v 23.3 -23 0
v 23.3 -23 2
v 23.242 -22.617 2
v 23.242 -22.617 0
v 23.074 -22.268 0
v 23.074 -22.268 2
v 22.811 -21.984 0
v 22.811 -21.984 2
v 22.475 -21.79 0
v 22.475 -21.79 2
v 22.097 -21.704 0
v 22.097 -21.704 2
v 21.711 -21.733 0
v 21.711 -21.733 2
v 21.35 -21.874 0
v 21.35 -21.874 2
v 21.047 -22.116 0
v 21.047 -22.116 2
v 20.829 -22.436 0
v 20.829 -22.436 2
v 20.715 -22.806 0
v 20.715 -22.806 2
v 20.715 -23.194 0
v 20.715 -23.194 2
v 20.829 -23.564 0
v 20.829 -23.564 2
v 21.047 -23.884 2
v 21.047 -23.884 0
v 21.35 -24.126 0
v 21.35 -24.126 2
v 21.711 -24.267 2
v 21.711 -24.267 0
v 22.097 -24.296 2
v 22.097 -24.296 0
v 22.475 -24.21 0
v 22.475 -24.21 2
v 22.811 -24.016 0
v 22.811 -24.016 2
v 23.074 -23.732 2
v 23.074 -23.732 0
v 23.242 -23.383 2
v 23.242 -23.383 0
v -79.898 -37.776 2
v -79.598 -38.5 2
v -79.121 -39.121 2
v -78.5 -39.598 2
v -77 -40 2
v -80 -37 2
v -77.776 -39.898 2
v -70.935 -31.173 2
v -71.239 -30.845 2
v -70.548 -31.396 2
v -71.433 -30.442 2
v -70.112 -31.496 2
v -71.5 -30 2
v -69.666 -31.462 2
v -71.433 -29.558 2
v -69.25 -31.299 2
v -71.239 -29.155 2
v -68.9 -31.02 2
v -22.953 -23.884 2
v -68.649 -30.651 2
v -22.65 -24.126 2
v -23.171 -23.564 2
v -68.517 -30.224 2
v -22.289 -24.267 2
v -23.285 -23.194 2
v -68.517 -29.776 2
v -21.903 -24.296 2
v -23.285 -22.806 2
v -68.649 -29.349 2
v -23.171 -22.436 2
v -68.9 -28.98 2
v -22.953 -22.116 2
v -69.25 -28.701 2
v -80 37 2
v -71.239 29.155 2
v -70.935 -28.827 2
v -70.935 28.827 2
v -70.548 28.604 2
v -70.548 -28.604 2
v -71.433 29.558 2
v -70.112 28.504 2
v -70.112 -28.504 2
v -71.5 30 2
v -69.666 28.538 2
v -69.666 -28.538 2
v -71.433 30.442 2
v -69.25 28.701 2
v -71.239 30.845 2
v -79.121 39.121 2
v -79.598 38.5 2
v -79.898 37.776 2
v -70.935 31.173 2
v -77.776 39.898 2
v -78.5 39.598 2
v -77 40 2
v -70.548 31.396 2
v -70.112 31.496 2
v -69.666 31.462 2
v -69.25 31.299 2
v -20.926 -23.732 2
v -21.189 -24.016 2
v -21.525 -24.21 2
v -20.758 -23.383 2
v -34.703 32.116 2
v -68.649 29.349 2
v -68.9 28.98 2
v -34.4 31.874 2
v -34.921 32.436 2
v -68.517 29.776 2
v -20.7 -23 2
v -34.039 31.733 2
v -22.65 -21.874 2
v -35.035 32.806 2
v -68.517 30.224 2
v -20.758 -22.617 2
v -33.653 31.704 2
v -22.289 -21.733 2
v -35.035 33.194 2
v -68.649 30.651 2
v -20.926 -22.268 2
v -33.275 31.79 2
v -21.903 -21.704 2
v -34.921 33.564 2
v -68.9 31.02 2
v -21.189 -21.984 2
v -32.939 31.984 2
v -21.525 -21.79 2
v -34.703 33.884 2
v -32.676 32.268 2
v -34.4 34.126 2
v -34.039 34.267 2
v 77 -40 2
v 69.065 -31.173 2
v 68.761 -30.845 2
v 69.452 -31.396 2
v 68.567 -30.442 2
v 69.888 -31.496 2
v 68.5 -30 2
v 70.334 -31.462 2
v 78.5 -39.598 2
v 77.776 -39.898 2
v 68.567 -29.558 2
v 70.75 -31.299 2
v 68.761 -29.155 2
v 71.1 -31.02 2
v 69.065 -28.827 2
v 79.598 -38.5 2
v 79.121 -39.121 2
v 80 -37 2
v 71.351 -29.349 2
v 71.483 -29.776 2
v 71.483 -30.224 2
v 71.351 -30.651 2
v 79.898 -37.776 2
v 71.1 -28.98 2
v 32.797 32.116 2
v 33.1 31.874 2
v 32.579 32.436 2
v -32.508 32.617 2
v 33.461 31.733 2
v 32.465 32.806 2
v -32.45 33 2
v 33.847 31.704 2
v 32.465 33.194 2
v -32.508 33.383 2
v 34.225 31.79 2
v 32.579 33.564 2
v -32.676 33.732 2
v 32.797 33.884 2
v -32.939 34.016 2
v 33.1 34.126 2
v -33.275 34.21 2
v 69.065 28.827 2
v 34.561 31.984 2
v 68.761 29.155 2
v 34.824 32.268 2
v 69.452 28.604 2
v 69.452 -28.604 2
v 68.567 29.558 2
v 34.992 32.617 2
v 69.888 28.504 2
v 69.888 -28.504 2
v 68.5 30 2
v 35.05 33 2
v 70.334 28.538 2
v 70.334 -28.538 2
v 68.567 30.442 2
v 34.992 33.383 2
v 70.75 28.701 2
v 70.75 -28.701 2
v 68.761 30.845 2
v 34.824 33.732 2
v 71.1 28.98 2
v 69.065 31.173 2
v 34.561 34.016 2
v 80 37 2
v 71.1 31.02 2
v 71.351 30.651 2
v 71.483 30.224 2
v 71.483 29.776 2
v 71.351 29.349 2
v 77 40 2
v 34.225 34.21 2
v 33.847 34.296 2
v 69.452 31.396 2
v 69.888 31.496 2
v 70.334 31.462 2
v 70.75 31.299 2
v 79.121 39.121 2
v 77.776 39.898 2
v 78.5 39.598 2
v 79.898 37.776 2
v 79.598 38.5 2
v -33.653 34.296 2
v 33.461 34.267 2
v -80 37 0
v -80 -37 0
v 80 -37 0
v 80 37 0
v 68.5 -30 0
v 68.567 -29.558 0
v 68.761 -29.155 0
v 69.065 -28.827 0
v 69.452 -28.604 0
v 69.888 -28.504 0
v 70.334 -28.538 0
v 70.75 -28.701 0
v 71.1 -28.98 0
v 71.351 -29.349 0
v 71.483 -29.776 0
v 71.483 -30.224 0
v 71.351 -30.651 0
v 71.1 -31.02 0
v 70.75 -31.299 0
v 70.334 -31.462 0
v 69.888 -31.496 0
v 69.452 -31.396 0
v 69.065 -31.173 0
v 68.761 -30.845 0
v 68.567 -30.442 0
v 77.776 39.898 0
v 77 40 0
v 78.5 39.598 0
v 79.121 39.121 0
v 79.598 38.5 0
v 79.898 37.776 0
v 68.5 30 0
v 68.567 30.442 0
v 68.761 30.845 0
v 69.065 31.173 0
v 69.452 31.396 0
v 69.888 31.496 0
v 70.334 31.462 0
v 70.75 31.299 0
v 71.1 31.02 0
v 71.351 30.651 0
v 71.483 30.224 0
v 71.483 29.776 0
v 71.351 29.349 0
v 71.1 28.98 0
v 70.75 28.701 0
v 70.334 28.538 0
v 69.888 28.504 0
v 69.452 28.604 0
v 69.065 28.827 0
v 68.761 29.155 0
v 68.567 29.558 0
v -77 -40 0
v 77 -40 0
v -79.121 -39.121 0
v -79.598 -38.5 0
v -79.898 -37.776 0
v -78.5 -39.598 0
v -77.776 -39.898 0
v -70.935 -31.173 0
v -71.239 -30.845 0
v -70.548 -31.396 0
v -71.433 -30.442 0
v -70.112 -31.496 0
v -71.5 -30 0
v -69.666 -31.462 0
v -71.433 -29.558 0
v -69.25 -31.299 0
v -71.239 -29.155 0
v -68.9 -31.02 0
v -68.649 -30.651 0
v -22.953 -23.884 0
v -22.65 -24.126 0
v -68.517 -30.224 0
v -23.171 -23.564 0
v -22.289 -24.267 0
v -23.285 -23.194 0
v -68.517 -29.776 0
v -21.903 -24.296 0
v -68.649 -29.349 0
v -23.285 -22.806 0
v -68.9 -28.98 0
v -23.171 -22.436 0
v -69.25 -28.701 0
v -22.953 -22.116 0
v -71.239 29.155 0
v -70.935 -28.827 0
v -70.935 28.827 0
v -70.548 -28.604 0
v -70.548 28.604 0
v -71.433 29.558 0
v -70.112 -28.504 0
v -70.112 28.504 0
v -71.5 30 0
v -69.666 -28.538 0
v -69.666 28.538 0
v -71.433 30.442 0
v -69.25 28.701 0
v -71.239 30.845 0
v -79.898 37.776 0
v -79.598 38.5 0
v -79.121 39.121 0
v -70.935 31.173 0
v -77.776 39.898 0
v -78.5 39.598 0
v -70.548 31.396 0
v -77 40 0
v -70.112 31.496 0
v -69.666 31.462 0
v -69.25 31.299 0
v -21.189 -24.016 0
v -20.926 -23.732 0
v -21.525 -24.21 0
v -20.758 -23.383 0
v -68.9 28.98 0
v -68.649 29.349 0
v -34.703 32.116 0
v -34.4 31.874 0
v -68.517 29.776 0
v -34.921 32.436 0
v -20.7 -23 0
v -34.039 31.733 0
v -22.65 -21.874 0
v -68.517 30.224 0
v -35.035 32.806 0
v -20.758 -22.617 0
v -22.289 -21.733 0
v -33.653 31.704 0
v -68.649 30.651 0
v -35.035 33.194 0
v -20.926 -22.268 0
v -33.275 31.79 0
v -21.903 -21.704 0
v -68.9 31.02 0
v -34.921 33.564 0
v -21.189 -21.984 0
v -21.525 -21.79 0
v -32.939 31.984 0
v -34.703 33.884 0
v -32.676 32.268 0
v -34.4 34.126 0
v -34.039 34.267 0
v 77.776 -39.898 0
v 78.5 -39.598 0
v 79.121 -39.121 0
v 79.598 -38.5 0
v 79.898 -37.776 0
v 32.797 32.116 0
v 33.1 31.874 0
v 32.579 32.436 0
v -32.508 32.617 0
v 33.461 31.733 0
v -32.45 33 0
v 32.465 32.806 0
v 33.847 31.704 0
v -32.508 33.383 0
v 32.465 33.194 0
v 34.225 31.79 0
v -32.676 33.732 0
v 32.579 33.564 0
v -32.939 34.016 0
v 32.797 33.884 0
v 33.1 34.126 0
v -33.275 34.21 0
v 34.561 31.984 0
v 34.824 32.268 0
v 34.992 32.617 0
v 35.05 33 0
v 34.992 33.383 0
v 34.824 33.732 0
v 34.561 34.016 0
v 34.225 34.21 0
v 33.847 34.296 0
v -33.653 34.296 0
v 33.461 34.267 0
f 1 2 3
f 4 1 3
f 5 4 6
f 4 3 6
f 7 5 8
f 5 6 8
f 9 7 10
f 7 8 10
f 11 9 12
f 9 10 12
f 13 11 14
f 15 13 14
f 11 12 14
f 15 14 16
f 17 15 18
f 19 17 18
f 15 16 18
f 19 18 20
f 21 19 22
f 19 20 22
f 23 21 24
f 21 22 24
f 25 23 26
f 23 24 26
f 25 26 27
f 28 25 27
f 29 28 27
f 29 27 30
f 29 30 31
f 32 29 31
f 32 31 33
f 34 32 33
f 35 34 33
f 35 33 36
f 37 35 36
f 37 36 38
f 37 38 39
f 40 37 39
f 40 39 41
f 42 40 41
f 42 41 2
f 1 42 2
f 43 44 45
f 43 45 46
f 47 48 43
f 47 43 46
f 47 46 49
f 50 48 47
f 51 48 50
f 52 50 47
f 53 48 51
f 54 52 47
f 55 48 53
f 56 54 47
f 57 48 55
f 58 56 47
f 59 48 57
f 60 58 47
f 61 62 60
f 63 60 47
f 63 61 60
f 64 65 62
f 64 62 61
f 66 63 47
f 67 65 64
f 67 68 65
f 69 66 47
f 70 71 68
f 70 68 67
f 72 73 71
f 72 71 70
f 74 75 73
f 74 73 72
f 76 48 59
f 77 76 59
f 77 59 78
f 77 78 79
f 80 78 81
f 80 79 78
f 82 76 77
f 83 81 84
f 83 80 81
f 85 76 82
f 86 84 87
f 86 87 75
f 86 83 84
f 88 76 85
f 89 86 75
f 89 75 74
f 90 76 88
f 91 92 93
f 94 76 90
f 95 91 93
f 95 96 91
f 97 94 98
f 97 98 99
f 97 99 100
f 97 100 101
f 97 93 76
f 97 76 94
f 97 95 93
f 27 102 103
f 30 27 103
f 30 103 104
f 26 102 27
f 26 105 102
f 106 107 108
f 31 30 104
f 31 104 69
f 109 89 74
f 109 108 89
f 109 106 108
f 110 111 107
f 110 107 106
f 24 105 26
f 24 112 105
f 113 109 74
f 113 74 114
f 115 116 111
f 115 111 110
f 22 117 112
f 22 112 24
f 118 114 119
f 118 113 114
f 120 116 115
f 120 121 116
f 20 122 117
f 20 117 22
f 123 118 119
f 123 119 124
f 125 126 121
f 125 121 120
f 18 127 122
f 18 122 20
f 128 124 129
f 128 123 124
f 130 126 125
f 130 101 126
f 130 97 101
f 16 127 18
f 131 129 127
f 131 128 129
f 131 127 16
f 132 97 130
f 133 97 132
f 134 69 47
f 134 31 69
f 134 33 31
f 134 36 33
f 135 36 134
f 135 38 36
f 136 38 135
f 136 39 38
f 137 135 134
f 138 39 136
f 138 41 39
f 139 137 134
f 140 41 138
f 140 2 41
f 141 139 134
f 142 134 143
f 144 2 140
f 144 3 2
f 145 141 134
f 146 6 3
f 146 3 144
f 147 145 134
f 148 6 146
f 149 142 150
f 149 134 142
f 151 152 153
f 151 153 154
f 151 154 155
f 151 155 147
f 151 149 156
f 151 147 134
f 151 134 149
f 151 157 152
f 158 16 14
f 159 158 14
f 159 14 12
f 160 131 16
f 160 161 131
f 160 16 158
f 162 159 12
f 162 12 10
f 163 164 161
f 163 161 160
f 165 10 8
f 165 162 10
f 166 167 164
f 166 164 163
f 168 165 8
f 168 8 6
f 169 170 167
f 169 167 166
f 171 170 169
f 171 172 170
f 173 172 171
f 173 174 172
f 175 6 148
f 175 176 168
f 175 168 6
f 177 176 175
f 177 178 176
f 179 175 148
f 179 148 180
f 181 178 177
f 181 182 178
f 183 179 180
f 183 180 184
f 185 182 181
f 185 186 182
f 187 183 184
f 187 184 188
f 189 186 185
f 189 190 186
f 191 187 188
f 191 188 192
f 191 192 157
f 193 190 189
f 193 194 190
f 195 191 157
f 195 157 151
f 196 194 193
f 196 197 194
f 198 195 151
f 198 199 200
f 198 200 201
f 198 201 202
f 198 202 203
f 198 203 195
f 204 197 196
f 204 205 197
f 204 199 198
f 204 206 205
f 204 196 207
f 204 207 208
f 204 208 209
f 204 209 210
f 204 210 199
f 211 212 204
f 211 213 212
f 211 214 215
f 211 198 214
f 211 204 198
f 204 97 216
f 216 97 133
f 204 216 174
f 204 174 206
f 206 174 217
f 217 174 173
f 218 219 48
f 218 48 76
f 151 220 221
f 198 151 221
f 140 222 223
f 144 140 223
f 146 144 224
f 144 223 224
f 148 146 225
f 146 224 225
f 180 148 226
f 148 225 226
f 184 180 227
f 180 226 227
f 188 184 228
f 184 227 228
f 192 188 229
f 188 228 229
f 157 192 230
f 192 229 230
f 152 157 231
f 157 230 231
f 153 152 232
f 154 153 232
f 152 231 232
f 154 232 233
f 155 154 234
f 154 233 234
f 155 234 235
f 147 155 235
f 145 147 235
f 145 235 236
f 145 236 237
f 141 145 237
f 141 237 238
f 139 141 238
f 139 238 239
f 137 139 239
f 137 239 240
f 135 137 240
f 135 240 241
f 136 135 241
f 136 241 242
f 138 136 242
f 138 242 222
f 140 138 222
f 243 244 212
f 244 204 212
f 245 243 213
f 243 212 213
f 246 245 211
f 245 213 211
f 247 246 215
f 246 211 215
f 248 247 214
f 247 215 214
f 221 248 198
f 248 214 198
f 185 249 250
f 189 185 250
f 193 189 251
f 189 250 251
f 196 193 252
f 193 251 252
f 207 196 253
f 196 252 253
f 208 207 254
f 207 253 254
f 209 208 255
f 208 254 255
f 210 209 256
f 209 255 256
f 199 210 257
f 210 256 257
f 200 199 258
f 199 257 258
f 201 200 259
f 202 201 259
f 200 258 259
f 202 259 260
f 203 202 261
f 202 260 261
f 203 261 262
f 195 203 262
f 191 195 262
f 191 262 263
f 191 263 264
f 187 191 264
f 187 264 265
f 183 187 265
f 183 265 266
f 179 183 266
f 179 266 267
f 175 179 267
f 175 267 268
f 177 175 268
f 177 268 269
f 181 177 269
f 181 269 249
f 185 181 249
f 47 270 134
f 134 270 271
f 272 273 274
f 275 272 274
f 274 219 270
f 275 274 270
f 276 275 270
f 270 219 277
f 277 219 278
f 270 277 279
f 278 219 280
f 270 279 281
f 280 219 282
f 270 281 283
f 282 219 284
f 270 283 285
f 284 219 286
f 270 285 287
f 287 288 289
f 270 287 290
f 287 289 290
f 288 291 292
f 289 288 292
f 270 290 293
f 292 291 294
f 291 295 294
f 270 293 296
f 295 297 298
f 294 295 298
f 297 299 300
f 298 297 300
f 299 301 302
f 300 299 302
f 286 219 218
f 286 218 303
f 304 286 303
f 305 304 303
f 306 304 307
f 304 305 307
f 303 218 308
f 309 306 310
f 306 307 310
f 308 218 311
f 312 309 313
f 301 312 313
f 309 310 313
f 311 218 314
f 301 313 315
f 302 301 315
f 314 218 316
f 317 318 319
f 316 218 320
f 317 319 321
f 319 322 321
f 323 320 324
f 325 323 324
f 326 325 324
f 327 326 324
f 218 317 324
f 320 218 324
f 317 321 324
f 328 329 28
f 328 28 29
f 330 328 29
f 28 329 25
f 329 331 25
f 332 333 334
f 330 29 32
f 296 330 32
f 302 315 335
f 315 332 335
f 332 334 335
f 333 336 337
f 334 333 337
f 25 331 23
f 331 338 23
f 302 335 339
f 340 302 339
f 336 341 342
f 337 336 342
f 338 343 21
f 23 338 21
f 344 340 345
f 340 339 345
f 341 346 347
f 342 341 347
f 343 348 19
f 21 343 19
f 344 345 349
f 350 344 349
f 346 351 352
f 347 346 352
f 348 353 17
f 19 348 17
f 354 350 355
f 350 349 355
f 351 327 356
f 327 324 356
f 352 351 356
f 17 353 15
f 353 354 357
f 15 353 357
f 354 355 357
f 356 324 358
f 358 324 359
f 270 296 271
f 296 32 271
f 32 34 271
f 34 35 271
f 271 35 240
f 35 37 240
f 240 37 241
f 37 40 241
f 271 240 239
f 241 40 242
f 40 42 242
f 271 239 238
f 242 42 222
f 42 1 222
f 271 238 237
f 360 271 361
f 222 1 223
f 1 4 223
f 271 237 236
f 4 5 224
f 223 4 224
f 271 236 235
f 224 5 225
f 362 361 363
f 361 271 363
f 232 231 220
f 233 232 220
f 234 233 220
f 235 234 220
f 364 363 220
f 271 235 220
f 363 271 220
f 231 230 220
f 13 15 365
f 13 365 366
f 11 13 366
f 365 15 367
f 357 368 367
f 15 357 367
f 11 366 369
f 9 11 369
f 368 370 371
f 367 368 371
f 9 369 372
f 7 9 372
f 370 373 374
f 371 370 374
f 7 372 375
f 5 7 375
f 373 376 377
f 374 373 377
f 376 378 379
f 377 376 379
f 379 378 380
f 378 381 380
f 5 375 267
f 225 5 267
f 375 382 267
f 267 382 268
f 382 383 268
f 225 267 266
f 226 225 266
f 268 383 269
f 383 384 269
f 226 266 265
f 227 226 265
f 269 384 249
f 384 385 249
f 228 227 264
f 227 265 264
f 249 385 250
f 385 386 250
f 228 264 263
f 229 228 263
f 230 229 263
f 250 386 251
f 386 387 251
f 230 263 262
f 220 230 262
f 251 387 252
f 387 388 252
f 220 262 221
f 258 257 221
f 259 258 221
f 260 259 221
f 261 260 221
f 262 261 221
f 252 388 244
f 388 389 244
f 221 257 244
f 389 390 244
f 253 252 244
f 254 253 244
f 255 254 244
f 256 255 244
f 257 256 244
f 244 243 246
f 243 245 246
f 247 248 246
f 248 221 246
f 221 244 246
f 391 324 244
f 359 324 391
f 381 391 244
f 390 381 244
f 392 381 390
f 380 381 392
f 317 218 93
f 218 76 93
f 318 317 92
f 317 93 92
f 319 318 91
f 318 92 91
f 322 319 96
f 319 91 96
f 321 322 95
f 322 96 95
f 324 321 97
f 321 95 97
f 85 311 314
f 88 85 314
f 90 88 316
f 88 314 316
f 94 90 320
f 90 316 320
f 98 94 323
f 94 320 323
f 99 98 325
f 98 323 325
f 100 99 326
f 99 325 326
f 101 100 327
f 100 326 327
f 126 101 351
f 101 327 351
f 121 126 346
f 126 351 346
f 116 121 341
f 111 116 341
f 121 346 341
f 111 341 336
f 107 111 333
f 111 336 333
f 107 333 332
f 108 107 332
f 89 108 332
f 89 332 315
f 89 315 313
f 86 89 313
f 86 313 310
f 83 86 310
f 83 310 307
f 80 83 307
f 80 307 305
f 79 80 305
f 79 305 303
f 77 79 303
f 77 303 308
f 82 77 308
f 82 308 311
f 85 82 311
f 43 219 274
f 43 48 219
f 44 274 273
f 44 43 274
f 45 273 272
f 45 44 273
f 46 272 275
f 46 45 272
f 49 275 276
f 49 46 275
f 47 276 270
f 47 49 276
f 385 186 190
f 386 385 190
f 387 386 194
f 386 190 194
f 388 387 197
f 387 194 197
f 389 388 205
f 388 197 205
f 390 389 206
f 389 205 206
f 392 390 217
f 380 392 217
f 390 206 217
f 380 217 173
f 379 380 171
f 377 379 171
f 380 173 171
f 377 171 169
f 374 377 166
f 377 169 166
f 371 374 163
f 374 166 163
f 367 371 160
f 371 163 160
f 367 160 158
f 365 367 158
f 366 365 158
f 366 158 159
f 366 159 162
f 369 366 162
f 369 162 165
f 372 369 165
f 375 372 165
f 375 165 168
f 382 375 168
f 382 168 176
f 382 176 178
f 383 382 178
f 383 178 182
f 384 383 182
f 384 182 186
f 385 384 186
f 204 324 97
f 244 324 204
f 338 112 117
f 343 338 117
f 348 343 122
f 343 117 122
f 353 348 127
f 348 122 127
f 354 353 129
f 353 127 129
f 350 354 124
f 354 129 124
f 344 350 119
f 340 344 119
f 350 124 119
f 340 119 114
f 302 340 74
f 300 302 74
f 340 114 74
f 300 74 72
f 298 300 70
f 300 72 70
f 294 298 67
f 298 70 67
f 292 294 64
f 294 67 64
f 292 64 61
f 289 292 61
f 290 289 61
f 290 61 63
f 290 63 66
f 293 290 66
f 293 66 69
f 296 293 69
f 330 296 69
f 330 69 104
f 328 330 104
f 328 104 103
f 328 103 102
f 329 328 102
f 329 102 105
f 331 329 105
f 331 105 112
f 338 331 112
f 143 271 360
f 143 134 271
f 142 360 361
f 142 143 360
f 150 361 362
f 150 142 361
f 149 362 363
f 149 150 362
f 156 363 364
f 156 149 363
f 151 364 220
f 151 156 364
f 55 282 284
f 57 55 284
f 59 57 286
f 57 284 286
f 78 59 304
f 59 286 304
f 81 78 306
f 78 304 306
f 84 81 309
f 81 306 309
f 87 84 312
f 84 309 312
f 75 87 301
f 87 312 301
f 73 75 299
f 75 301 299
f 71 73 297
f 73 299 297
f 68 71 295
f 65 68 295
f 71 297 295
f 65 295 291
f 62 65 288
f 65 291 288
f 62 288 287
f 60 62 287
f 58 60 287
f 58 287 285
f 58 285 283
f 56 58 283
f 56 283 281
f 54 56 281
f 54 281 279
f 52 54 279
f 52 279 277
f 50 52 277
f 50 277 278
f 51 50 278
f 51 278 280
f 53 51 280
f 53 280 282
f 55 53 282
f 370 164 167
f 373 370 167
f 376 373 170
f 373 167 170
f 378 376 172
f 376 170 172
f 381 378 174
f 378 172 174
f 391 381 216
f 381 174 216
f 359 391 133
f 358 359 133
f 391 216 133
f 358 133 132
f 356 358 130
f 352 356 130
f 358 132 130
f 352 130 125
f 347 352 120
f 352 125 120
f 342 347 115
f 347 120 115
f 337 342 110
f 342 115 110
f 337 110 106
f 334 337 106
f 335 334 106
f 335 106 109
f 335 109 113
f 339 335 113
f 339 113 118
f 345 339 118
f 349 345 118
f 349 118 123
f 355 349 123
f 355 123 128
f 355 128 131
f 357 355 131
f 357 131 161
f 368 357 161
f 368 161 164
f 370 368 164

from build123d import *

# Parameters (mm, degrees)
SKETCH_1_W          = 160
SKETCH_1_H          = 80
EXTRUDE_1_DEPTH     = 2
SKETCH_2_R          = 1.3
CUT_EXTRUDE_1_DEPTH = 90.465076985
SKETCH_7_R          = 1.5
CUT_EXTRUDE_3_DEPTH = 90.465076985
FILLET_1_R          = 3


with BuildPart() as part:
    # 草图1 → 凸台-拉伸1 (new body)
    with BuildSketch(Plane.XY):
        Rectangle(SKETCH_1_W, SKETCH_1_H)
    extrude(amount=EXTRUDE_1_DEPTH)

    # 草图2 → 切除-拉伸1 (cut, through all)
    with BuildSketch(Plane.XY.offset(2)):
        with Locations((-33.75, 33)):
            Circle(SKETCH_2_R)
        with Locations((33.75, 33)):
            Circle(SKETCH_2_R)
        with Locations((-22, -23)):
            Circle(SKETCH_2_R)
        with Locations((22, -23)):
            Circle(SKETCH_2_R)
    extrude(amount=-CUT_EXTRUDE_1_DEPTH, mode=Mode.SUBTRACT)

    # 草图7 → 切除-拉伸3 (cut, through all)
    with BuildSketch(Plane(origin=(0, 0, 0), x_dir=(-1, 0, 0), z_dir=(0, 0, -1))):
        with Locations((-70, -30)):
            Circle(SKETCH_7_R)
        with Locations((-70, 30)):
            Circle(SKETCH_7_R)
        with Locations((70, 30)):
            Circle(SKETCH_7_R)
        with Locations((70, -30)):
            Circle(SKETCH_7_R)
    extrude(amount=-CUT_EXTRUDE_3_DEPTH, mode=Mode.SUBTRACT)

    # 圆角1
    fillet_1_edges = [part.edges().sort_by_distance(p)[0] for p in [
        (-80, -40, 1),
        (-80, 40, 1),
        (80, 40, 1),
        (80, -40, 1),
    ]]
    fillet(fillet_1_edges, radius=FILLET_1_R)


solid = part.part
